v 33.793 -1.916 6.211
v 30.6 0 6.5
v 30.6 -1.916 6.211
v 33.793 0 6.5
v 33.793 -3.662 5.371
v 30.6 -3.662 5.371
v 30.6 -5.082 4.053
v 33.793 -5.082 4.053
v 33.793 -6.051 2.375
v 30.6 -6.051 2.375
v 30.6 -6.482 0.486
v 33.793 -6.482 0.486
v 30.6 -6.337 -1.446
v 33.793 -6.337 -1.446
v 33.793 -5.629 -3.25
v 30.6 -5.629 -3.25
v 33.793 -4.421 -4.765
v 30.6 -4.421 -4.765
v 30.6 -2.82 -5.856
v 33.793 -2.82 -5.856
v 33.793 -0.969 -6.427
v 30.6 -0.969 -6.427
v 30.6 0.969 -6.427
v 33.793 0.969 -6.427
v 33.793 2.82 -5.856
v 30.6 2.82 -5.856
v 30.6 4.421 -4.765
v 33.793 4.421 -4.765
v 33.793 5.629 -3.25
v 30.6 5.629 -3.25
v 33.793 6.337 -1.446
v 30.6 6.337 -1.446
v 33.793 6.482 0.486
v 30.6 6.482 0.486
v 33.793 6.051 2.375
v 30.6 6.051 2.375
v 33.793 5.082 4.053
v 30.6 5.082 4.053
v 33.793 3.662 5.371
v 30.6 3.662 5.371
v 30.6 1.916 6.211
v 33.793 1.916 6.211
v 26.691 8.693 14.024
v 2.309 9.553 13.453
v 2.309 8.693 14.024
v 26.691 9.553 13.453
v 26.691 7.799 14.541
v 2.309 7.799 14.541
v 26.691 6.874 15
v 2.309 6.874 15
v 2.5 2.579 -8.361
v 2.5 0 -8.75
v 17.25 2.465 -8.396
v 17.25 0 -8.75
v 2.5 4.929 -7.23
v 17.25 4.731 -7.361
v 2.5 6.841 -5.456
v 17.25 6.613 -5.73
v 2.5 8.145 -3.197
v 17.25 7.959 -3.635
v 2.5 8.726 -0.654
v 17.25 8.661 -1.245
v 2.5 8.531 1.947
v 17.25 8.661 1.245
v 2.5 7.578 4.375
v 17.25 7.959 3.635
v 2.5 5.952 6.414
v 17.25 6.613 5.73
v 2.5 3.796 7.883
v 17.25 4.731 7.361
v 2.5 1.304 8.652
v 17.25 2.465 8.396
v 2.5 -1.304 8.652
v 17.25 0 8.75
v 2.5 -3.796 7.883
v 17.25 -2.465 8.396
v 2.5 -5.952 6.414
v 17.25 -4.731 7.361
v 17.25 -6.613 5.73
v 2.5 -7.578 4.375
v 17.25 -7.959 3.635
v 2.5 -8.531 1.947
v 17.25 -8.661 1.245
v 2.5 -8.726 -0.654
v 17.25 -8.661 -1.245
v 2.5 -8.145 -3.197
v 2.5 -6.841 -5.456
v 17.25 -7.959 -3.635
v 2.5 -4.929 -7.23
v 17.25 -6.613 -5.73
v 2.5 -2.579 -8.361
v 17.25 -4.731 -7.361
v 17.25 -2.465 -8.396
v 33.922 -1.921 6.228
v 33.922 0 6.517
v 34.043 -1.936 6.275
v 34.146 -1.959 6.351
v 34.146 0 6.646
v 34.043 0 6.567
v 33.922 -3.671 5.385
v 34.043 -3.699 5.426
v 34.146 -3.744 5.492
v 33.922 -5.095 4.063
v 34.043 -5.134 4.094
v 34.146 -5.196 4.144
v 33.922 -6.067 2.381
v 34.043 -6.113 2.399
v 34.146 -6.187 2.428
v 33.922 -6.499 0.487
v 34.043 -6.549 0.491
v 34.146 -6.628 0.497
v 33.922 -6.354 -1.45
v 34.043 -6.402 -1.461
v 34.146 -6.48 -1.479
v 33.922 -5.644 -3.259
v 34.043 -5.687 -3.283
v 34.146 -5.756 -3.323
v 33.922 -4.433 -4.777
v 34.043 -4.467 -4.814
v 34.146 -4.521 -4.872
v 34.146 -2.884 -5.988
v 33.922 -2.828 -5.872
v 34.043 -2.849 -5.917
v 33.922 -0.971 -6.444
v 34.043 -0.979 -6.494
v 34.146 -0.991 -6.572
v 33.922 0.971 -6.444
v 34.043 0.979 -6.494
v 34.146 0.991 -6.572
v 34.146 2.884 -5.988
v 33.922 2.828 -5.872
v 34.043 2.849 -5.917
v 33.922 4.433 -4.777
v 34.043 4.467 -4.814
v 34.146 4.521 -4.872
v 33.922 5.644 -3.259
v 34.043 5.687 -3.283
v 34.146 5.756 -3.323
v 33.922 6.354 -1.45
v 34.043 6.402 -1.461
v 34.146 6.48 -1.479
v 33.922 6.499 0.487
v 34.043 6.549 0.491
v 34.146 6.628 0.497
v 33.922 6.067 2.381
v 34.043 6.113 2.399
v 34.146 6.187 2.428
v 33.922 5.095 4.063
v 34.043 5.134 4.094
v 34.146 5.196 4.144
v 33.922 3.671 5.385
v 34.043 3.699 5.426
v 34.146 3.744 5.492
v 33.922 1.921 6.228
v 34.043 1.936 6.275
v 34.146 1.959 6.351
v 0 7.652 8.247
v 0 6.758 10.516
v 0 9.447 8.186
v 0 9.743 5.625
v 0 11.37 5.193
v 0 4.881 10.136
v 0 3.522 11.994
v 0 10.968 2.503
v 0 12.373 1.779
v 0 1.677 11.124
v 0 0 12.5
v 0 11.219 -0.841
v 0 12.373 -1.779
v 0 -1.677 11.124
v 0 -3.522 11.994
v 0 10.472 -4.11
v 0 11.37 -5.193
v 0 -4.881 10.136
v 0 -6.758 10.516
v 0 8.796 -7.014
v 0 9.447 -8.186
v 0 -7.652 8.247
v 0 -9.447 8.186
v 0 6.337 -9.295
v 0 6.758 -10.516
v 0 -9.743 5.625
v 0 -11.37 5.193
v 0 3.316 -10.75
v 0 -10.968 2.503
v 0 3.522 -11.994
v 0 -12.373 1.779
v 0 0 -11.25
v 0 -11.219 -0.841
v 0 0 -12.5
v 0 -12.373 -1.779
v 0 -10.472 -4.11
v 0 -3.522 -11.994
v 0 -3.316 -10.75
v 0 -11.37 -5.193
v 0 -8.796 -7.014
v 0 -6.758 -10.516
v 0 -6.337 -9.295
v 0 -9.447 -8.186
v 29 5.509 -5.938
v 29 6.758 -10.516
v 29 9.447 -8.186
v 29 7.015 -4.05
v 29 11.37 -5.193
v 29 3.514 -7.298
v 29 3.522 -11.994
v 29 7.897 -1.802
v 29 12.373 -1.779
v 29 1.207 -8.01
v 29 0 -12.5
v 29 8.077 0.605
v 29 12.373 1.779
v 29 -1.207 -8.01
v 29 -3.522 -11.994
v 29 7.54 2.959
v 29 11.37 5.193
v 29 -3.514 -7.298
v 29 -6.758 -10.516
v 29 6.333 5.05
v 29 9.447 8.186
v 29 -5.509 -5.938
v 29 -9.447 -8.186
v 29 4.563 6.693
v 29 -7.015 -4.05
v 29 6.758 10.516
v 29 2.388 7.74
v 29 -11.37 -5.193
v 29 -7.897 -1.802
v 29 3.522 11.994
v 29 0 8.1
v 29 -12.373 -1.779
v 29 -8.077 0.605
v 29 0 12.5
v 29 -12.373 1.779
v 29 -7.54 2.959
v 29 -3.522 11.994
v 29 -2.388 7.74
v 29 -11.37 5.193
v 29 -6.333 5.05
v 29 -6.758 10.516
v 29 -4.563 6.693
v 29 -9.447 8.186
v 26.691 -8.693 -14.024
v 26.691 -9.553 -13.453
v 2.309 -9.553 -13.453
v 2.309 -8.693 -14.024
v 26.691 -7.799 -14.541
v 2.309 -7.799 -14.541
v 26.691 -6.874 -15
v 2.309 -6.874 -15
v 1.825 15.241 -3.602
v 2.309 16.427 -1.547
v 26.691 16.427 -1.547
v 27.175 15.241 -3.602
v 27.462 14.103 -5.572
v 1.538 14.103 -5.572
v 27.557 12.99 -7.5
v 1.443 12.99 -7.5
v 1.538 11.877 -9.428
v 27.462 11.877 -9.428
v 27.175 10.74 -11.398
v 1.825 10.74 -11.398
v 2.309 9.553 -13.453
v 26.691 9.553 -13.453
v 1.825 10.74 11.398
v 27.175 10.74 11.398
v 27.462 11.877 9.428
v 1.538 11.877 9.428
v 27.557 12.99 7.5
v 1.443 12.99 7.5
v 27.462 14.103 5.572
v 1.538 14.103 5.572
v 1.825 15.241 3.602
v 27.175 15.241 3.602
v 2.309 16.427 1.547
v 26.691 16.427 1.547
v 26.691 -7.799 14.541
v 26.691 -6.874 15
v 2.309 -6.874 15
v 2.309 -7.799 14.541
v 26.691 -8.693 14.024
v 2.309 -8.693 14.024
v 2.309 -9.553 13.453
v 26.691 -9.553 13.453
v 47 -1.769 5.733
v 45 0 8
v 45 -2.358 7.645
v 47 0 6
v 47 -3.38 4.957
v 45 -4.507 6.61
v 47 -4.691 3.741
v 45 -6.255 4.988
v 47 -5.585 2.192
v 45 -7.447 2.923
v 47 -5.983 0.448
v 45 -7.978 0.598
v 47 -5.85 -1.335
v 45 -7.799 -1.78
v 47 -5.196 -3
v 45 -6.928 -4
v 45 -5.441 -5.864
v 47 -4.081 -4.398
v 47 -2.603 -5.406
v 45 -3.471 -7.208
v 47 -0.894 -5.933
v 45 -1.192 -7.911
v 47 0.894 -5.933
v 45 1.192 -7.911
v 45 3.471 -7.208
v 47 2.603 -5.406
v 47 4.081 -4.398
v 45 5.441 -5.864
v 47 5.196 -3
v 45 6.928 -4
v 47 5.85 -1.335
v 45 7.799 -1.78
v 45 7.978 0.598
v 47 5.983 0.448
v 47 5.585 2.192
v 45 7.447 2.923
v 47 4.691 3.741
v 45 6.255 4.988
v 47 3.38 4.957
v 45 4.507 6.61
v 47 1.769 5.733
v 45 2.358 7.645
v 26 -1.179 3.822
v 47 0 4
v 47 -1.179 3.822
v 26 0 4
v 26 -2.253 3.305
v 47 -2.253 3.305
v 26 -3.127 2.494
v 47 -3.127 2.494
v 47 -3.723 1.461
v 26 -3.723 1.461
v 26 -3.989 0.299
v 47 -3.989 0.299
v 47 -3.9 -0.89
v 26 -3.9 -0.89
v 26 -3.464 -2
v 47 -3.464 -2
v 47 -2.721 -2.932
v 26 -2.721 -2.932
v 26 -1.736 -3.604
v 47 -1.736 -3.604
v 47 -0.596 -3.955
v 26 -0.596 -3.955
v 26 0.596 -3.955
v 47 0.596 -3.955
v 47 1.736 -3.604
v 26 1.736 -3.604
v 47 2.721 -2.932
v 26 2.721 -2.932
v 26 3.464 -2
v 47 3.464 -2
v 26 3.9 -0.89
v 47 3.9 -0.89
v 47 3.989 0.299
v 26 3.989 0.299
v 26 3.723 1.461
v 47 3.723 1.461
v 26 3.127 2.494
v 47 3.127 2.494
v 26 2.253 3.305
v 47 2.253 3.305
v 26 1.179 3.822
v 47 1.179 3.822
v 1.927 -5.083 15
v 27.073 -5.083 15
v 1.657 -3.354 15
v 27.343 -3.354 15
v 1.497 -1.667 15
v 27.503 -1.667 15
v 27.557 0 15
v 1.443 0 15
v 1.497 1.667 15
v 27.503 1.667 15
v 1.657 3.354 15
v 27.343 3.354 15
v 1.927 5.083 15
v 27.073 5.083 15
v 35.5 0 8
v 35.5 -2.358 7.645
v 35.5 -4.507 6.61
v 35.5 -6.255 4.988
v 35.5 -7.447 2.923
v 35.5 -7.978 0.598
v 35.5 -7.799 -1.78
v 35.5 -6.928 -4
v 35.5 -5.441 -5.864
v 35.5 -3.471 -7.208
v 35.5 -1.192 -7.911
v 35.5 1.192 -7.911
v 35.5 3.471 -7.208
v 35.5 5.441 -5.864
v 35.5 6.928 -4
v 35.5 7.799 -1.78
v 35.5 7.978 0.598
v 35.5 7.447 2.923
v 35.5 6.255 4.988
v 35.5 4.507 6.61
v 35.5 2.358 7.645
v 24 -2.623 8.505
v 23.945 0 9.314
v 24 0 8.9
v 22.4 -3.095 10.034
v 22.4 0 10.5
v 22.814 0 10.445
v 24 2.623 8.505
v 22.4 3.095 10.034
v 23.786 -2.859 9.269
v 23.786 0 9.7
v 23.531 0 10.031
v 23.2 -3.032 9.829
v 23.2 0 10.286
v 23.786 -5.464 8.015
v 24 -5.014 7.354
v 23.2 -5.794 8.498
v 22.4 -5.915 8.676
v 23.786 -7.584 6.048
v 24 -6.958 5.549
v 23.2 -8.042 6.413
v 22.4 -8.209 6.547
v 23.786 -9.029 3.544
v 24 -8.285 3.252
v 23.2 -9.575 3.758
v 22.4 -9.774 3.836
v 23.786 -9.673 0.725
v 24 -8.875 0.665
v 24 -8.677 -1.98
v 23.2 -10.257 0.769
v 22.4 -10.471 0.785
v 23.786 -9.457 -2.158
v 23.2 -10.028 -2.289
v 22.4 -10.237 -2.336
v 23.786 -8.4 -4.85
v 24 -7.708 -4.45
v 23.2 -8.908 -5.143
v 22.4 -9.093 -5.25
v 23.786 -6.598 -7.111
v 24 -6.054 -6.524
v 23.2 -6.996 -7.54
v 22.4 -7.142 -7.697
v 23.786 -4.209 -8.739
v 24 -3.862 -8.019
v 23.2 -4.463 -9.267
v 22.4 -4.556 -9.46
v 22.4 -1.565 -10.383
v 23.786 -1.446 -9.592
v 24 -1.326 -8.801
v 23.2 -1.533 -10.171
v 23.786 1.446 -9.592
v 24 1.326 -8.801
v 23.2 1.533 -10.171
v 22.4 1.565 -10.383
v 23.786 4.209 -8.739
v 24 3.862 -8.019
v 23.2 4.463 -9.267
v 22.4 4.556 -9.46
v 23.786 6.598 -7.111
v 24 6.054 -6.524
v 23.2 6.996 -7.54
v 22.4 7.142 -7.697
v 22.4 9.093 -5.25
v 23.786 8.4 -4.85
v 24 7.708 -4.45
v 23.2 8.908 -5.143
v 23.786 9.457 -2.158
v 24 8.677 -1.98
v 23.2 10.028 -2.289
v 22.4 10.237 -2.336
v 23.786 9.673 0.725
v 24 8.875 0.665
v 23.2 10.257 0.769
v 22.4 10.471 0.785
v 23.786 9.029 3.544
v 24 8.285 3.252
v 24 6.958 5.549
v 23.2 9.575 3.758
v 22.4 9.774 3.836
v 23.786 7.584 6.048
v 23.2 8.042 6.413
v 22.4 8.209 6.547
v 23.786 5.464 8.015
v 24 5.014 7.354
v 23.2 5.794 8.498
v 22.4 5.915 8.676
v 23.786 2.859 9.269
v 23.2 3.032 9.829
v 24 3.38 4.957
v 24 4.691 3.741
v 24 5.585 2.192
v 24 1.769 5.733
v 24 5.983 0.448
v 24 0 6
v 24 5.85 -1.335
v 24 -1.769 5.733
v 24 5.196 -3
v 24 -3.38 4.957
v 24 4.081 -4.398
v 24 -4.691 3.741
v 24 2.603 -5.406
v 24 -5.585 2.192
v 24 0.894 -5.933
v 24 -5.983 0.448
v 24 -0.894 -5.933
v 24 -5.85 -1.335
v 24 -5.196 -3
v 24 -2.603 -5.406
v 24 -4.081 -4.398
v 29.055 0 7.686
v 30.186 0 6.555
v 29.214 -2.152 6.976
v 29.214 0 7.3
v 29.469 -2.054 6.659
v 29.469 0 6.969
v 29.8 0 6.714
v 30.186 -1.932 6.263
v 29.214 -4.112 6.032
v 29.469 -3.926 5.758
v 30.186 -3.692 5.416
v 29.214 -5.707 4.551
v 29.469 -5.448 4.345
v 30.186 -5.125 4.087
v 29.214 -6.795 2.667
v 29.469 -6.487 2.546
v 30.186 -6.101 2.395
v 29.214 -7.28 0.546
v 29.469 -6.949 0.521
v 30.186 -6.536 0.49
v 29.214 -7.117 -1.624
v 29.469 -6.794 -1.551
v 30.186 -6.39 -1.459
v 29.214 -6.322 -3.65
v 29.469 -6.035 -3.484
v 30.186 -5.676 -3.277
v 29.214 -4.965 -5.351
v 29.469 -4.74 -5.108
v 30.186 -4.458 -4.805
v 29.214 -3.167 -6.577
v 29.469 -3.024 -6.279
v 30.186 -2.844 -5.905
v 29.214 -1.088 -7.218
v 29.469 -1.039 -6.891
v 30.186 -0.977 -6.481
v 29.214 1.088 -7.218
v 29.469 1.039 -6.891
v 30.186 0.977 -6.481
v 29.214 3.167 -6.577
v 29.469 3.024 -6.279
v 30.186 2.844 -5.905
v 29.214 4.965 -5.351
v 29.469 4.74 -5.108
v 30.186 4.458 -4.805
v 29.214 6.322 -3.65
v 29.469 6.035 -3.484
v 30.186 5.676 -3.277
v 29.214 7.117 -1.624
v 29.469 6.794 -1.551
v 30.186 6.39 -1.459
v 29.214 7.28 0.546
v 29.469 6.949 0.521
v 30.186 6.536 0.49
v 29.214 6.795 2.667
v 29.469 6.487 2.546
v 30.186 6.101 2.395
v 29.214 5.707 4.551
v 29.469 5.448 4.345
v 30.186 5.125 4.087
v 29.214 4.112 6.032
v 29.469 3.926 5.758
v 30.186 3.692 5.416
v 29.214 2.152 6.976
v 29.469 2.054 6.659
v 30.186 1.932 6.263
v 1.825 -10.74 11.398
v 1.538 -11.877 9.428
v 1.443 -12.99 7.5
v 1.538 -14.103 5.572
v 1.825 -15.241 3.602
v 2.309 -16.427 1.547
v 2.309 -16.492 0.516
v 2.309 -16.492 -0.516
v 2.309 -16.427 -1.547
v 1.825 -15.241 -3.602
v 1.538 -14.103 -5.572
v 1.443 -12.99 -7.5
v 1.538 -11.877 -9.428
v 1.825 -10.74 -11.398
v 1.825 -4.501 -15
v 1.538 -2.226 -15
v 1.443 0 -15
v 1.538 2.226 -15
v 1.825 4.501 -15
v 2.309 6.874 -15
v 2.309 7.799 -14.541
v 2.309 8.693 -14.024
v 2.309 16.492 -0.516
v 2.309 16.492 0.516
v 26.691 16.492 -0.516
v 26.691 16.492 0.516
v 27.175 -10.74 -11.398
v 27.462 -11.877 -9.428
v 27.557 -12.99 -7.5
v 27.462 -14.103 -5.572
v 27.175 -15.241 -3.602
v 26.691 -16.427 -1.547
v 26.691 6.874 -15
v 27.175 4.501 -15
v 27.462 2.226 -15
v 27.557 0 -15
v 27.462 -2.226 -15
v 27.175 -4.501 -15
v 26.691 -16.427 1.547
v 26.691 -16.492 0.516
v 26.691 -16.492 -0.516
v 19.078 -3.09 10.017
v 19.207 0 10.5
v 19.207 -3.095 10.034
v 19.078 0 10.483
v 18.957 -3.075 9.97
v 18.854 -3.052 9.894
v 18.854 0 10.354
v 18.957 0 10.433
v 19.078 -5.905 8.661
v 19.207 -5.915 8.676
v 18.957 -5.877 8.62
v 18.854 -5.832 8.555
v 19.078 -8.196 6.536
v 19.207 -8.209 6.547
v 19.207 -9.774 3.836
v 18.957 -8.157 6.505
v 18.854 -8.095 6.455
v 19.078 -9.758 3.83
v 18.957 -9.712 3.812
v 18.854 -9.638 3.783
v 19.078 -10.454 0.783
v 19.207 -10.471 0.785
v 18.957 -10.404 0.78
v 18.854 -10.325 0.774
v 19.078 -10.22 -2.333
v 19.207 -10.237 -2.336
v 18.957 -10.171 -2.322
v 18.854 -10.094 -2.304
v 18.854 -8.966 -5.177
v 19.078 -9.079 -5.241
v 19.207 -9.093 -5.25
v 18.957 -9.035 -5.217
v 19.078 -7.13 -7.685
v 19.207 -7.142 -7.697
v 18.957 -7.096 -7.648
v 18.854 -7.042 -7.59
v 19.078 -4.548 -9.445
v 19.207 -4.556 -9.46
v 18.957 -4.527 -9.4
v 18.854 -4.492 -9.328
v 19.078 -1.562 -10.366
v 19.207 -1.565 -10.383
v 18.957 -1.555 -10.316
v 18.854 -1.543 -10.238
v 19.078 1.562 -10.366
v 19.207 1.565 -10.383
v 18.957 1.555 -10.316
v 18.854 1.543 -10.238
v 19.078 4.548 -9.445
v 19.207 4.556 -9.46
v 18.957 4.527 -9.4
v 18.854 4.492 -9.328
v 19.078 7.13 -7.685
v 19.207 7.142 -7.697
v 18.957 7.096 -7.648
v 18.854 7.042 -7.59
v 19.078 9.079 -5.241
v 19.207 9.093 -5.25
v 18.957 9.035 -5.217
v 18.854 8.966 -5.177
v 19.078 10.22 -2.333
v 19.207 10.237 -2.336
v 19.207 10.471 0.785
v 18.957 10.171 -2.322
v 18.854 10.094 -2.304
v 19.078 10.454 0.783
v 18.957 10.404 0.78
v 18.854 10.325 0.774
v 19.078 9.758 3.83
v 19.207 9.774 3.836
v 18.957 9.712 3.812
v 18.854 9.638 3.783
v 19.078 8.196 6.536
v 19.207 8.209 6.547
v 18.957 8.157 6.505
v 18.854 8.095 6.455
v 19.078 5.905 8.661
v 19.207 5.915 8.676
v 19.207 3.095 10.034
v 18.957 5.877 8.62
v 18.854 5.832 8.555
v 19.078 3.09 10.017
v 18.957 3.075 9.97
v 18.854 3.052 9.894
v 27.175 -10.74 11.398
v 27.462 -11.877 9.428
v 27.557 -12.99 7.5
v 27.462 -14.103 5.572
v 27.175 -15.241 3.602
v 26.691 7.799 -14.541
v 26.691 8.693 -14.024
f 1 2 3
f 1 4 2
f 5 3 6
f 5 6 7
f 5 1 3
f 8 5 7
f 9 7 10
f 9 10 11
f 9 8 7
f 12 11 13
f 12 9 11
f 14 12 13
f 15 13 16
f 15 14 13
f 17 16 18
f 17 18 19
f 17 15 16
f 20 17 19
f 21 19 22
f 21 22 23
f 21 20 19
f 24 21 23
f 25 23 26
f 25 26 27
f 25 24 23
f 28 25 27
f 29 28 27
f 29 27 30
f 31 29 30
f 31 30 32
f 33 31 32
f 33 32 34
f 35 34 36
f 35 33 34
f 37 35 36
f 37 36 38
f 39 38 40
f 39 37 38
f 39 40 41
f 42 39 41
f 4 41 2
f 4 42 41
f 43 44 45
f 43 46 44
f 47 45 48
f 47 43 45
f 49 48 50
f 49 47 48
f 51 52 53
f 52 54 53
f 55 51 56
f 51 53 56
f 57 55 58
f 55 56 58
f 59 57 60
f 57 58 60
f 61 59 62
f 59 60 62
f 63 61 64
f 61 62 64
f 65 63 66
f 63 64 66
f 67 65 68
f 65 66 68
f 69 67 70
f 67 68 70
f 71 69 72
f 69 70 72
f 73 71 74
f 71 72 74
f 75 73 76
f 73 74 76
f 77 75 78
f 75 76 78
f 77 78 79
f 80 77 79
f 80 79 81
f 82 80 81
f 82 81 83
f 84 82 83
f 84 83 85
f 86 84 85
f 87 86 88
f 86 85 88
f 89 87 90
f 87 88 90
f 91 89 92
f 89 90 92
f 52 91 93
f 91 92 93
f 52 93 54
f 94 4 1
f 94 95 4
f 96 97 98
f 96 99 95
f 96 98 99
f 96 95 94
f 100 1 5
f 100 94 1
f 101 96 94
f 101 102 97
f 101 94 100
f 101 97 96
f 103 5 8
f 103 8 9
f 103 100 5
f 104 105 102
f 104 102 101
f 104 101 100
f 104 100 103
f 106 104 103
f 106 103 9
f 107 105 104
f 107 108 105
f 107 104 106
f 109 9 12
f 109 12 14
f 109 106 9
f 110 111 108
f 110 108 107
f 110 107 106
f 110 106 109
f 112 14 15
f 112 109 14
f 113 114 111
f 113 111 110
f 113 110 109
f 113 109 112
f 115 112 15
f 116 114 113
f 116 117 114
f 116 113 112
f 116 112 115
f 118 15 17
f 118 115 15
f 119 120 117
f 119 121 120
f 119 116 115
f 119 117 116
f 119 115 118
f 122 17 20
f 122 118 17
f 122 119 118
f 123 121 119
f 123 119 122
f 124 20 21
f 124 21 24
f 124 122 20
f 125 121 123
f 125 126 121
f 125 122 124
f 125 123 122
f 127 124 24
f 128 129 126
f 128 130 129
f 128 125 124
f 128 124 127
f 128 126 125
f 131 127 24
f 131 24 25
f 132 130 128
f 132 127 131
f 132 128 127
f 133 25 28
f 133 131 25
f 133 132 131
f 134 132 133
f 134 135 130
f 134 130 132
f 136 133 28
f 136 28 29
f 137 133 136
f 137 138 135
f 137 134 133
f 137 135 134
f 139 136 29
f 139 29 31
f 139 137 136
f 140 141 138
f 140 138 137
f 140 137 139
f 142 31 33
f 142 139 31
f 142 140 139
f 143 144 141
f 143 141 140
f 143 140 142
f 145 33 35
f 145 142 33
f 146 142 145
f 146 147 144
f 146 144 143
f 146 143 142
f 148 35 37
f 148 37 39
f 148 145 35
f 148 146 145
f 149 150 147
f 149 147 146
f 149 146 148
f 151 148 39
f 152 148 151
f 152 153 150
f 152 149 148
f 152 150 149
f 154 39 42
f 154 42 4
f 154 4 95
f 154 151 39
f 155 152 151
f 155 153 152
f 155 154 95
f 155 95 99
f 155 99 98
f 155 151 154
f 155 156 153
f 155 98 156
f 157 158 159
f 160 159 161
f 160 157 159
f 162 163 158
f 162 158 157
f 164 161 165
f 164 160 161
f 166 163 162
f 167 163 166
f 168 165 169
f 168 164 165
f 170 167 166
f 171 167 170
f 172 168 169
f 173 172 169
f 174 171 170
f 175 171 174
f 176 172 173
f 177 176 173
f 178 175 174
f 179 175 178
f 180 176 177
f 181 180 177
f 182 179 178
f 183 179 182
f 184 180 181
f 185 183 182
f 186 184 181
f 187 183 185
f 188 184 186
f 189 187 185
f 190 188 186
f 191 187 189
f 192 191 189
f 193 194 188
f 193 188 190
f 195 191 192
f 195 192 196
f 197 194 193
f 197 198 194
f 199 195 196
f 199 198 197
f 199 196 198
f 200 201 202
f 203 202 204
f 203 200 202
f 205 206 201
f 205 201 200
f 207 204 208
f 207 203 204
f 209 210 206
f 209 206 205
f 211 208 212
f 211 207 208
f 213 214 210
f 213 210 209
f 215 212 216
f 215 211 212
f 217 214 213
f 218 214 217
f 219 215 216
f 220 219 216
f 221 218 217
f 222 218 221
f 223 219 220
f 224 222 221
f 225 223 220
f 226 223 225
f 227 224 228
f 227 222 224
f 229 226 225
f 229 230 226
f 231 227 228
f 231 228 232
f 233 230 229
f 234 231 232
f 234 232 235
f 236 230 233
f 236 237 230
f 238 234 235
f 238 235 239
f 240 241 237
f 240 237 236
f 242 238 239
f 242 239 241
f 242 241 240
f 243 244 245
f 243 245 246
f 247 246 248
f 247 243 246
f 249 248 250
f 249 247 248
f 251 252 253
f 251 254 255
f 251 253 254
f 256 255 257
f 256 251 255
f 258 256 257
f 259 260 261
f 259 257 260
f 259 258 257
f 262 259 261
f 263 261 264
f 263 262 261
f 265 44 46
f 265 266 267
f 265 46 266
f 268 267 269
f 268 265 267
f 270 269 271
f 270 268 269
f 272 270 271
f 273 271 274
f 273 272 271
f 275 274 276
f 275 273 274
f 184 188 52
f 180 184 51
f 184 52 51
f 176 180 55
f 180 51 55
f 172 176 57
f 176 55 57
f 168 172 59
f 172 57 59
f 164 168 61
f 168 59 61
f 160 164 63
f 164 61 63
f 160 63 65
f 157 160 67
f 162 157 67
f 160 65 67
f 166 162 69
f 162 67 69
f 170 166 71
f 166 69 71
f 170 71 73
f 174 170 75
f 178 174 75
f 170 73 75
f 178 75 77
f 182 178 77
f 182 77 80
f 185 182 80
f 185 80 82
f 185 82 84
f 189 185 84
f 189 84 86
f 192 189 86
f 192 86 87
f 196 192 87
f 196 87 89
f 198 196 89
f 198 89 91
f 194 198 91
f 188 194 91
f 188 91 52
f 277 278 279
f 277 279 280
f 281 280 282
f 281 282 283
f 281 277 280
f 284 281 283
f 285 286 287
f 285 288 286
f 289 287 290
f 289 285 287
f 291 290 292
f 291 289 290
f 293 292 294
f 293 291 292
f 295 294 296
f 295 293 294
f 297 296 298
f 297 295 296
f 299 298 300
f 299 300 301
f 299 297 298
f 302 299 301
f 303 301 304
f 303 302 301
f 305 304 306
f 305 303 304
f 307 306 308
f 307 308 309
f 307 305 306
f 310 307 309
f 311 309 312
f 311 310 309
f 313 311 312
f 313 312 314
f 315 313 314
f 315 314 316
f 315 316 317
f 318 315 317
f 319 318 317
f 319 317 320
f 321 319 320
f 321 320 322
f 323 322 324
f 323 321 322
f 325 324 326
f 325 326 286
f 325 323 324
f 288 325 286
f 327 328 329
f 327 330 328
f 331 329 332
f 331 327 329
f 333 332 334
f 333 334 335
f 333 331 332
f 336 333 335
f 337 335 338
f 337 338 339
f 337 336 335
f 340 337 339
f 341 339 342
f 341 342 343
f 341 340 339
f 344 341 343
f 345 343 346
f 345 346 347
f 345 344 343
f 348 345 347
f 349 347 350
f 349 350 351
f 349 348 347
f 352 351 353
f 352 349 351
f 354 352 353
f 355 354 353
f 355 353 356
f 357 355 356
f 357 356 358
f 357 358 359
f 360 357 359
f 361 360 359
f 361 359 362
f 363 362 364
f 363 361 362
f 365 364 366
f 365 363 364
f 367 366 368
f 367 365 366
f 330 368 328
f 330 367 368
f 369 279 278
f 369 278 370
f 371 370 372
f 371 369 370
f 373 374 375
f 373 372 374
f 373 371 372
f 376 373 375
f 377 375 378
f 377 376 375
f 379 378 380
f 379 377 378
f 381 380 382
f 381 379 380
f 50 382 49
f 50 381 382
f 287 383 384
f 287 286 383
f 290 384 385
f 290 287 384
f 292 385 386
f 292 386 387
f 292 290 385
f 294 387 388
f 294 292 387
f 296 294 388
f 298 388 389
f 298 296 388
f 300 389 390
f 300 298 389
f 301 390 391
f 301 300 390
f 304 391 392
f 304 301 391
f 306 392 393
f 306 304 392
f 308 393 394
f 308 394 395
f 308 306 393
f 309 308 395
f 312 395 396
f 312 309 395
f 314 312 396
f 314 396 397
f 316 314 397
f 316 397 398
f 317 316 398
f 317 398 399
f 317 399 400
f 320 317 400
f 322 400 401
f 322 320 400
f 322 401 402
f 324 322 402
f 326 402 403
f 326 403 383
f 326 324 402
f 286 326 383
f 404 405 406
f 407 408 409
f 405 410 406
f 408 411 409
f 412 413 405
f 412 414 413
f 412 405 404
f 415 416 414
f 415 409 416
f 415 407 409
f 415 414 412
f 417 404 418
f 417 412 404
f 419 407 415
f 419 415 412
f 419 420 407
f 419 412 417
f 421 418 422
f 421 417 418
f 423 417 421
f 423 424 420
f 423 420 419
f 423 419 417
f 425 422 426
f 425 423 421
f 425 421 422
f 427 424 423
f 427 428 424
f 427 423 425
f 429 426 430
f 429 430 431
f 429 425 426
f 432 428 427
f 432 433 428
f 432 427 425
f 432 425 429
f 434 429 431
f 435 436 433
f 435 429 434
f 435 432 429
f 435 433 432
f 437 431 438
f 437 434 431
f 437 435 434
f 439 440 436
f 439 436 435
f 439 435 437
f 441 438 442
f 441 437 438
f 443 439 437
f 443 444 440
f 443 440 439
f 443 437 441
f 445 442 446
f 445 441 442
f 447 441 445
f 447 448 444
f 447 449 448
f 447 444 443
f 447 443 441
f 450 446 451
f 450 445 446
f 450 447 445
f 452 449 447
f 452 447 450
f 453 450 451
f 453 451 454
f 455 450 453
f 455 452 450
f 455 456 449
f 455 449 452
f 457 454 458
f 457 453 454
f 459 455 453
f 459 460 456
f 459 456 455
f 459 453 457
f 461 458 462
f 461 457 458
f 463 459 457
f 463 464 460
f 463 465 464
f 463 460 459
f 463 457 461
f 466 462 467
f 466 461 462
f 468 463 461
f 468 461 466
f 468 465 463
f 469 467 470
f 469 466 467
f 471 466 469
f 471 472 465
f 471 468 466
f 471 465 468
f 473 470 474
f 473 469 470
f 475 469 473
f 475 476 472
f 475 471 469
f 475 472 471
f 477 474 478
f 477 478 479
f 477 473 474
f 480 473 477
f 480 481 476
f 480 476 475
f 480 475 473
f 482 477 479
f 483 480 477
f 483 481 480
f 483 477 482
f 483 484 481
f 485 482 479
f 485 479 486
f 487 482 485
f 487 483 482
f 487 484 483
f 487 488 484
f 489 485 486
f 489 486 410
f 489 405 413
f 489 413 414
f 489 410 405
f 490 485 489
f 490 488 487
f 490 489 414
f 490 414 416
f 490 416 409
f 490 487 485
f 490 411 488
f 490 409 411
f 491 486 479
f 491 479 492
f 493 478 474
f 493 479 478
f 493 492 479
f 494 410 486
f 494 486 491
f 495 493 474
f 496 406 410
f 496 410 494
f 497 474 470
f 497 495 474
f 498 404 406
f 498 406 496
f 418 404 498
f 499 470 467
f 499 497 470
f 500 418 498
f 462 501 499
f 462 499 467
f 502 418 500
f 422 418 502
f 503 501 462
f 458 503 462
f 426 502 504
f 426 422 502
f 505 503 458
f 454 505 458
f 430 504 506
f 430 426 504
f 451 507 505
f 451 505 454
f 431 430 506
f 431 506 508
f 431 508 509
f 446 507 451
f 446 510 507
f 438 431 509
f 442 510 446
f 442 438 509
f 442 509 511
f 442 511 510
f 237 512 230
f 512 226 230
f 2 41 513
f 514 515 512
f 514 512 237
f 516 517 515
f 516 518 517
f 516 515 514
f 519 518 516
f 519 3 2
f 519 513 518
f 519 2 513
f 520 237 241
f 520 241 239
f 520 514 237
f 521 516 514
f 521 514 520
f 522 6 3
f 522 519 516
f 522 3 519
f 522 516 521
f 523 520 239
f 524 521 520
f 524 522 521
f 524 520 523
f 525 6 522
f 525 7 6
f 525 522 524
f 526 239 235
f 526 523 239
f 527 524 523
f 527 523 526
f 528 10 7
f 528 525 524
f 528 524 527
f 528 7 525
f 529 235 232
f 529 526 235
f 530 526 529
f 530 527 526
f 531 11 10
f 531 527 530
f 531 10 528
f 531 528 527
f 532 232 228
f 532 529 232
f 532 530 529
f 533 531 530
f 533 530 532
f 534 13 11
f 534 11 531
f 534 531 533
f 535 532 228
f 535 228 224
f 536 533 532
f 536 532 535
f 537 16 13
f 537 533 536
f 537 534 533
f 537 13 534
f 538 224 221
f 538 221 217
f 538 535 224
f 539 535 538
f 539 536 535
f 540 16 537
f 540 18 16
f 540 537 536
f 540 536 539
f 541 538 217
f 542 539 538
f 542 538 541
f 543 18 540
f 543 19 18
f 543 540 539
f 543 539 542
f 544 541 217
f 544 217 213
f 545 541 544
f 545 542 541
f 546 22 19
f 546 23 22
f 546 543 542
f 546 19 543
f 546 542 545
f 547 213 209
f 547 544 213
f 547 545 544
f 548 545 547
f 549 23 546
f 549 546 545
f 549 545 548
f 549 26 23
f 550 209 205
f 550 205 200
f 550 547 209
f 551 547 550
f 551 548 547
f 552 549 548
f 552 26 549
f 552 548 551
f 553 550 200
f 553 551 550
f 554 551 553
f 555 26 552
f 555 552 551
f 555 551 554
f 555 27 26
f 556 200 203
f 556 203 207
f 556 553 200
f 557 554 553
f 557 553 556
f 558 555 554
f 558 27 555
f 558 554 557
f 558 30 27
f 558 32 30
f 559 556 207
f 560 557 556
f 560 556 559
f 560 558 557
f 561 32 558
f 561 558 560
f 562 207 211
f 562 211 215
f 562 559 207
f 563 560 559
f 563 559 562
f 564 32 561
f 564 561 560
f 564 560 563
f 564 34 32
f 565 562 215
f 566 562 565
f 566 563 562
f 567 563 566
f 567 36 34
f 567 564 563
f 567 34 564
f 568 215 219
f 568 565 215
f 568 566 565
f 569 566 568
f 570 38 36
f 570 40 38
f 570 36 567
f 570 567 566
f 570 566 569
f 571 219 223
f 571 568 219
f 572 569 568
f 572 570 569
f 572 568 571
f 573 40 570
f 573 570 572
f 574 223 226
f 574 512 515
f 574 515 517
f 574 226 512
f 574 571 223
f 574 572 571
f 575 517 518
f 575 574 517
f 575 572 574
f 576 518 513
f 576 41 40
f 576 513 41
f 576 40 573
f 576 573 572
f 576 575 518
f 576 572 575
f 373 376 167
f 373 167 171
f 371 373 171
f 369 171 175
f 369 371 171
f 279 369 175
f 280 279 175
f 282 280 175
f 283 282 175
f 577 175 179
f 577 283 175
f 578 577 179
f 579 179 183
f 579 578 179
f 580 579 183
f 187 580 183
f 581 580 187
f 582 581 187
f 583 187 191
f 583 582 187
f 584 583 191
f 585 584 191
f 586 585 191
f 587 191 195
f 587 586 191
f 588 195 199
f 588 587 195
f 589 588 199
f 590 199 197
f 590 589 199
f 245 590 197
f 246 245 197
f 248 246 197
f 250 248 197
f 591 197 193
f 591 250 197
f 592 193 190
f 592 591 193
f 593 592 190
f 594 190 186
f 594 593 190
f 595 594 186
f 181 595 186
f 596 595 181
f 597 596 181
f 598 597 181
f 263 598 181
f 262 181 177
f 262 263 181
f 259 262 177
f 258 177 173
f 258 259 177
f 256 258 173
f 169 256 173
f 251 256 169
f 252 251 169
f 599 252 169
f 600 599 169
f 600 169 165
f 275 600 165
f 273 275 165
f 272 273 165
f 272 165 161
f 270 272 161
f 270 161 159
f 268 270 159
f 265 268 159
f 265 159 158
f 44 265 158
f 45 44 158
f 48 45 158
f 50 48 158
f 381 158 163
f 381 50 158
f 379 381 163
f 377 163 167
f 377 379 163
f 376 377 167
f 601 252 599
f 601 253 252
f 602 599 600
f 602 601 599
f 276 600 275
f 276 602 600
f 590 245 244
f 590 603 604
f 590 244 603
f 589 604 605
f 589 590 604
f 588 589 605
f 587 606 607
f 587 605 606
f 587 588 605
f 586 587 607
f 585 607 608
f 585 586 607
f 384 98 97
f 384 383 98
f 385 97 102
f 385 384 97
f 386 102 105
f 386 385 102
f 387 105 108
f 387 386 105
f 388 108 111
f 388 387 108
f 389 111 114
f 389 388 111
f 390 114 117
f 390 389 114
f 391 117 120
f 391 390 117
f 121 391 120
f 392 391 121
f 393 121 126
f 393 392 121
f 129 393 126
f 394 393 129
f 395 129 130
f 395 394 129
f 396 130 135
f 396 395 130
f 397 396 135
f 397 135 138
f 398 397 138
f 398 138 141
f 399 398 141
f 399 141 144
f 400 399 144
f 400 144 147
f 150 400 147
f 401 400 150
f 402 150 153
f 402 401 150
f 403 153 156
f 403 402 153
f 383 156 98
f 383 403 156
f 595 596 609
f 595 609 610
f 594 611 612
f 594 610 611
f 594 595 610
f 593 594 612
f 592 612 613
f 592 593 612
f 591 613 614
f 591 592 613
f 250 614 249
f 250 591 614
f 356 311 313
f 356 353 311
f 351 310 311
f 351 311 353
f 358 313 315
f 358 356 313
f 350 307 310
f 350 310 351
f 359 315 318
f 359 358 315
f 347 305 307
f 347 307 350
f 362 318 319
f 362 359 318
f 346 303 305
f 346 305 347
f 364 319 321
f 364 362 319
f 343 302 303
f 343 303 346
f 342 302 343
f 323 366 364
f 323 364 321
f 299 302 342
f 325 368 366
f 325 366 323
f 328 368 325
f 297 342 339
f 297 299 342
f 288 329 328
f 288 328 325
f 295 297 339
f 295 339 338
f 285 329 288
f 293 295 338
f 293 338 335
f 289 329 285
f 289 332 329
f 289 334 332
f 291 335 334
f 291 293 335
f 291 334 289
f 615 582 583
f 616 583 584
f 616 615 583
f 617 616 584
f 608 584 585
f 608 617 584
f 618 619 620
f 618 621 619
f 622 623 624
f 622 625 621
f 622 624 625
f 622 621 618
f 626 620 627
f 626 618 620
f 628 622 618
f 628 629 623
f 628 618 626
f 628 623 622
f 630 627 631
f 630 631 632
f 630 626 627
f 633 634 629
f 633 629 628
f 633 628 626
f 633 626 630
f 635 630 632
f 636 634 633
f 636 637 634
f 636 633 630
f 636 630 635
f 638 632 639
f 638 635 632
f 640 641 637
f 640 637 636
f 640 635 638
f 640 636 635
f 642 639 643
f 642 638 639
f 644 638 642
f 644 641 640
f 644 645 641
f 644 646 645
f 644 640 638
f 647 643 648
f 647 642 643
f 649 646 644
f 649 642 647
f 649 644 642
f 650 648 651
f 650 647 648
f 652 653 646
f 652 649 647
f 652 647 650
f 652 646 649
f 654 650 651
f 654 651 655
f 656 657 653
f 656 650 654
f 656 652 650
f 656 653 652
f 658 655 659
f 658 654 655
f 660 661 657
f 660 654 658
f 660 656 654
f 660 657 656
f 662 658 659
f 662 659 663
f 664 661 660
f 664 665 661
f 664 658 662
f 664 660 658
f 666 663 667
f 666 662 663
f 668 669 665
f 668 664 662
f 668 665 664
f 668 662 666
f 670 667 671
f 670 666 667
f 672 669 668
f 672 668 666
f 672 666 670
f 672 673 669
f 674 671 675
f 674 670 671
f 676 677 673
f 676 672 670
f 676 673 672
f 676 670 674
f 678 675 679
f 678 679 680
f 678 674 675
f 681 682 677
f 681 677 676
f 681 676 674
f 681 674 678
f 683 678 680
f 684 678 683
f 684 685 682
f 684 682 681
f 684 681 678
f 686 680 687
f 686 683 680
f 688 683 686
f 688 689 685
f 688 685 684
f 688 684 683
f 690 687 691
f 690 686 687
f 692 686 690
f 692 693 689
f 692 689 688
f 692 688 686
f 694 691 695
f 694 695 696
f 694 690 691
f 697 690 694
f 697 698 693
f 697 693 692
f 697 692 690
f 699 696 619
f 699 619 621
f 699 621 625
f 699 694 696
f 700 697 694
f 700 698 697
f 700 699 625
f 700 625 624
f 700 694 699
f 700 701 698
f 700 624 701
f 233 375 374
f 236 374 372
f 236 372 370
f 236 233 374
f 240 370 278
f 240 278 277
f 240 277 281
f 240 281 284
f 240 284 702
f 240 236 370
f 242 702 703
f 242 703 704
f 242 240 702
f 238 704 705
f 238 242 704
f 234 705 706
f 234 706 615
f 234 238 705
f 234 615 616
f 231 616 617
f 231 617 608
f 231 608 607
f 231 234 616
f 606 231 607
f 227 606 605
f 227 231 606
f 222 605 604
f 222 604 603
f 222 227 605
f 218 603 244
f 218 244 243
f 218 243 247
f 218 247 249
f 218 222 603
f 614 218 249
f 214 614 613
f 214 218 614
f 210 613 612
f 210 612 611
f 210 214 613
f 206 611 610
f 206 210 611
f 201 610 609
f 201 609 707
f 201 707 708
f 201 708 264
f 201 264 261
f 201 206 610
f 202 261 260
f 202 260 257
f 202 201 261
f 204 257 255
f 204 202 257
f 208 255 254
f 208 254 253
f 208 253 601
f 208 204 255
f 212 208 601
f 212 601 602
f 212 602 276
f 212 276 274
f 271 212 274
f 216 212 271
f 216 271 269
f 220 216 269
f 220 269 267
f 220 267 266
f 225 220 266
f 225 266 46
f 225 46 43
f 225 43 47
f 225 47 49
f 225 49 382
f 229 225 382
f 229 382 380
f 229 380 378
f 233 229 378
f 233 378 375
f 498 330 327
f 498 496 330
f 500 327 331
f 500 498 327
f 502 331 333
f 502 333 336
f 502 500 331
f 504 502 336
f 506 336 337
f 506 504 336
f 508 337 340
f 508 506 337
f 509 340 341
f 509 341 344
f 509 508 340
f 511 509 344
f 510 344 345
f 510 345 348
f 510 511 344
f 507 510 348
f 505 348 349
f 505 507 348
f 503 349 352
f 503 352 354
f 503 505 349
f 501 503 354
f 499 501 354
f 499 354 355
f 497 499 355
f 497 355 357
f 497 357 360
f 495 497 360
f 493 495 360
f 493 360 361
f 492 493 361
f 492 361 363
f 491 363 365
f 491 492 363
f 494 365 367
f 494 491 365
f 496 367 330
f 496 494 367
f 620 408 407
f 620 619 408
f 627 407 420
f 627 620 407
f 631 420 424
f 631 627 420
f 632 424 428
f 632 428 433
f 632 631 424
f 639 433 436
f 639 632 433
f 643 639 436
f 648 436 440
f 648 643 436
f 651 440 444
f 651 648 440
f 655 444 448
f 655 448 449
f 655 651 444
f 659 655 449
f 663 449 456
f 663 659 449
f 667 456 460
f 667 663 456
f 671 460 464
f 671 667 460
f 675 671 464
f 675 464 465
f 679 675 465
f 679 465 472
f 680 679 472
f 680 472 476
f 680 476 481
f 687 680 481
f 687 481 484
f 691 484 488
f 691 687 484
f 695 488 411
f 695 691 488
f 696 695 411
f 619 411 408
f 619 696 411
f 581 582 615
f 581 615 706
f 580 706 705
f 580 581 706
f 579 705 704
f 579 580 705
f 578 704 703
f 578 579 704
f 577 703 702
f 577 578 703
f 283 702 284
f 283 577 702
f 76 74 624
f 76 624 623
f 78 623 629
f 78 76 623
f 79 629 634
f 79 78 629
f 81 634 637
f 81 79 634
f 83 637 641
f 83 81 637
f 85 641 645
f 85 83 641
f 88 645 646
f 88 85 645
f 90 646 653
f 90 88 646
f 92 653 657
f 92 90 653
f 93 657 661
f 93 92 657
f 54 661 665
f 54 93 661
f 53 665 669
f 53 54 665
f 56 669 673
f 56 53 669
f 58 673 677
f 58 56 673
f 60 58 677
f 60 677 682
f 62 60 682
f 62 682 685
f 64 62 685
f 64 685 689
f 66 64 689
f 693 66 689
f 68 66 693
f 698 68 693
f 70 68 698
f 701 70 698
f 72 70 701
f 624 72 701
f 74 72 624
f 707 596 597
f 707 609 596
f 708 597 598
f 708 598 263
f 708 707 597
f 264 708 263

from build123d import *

# Parameters (mm, degrees)
HOLE_WIZARD_1_D           = 17.5
HOLE_WIZARD_1_DEPTH       = 23.999
HOLE_WIZARD_1_CSINK_D     = 22.5
HOLE_WIZARD_1_CSINK_ANGLE = 90
SKETCH_4_OUTSIDE_W        = 48.246
SKETCH_4_OUTSIDE_H        = 48.246
CUT_EXTRUDE_1_DEPTH       = 53.473802988


with BuildPart() as part:
    # Эскиз1 → Повернуть1 (revolve)
    with BuildSketch(Plane.XY, mode=Mode.PRIVATE) as revolve_1_sk:
        with BuildLine():
            Line((30.6, 6.5), (33.792893219, 6.5))
            ThreePointArc((33.792893219, 6.5), (33.984234935, 6.538060234), (34.146446609, 6.646446609))
            Line((34.146446609, 6.646446609), (35.5, 8))
            Line((35.5, 8), (45, 8))
            Line((45, 8), (47, 6))
            Line((47, 6), (47, 4))
            Line((47, 4), (26, 4))
            Line((26, 4), (24, 6))
            Line((24, 6), (24, 8.9))
            ThreePointArc((24, 8.9), (23.53137085, 10.03137085), (22.4, 10.5))
            Line((22.4, 10.5), (19.207106781, 10.5))
            ThreePointArc((19.207106781, 10.5), (19.015765065, 10.461939766), (18.853553391, 10.353553391))
            Line((18.853553391, 10.353553391), (8.5, 0))
            Line((8.5, 0), (0, 0))
            Line((0, 0), (0, 12.5))
            Line((0, 12.5), (2.309401077, 16.5))
            Line((2.309401077, 16.5), (26.690598923, 16.5))
            Line((26.690598923, 16.5), (29, 12.5))
            Line((29, 12.5), (29, 8.1))
            ThreePointArc((29, 8.1), (29.46862915, 6.96862915), (30.6, 6.5))
        make_face()
    revolve(revolve_1_sk.sketch.rotate(Axis((-14.464864865, 0, 0), (1, 0, 0)), 90), axis=Axis((-14.464864865, 0, 0), (1, 0, 0)))

    # Отверстие обработанное метчиком 1
    with Locations(Plane.ZY):
        with Locations((0, 0)):
            CounterSinkHole(HOLE_WIZARD_1_D / 2, HOLE_WIZARD_1_CSINK_D / 2, depth=HOLE_WIZARD_1_DEPTH, counter_sink_angle=HOLE_WIZARD_1_CSINK_ANGLE)

    # Эскиз4 outside → Вырез-Вытянуть1 (cut, through all)
    with BuildSketch(Plane.ZY):
        Rectangle(SKETCH_4_OUTSIDE_W, SKETCH_4_OUTSIDE_H)
        Polygon((0, 17.320508076), (-15, 8.660254038), (-15, -8.660254038), (0, -17.320508076), (15, -8.660254038), (15, 8.660254038), align=None, mode=Mode.SUBTRACT)
    extrude(amount=-CUT_EXTRUDE_1_DEPTH, mode=Mode.SUBTRACT)


solid = part.part
